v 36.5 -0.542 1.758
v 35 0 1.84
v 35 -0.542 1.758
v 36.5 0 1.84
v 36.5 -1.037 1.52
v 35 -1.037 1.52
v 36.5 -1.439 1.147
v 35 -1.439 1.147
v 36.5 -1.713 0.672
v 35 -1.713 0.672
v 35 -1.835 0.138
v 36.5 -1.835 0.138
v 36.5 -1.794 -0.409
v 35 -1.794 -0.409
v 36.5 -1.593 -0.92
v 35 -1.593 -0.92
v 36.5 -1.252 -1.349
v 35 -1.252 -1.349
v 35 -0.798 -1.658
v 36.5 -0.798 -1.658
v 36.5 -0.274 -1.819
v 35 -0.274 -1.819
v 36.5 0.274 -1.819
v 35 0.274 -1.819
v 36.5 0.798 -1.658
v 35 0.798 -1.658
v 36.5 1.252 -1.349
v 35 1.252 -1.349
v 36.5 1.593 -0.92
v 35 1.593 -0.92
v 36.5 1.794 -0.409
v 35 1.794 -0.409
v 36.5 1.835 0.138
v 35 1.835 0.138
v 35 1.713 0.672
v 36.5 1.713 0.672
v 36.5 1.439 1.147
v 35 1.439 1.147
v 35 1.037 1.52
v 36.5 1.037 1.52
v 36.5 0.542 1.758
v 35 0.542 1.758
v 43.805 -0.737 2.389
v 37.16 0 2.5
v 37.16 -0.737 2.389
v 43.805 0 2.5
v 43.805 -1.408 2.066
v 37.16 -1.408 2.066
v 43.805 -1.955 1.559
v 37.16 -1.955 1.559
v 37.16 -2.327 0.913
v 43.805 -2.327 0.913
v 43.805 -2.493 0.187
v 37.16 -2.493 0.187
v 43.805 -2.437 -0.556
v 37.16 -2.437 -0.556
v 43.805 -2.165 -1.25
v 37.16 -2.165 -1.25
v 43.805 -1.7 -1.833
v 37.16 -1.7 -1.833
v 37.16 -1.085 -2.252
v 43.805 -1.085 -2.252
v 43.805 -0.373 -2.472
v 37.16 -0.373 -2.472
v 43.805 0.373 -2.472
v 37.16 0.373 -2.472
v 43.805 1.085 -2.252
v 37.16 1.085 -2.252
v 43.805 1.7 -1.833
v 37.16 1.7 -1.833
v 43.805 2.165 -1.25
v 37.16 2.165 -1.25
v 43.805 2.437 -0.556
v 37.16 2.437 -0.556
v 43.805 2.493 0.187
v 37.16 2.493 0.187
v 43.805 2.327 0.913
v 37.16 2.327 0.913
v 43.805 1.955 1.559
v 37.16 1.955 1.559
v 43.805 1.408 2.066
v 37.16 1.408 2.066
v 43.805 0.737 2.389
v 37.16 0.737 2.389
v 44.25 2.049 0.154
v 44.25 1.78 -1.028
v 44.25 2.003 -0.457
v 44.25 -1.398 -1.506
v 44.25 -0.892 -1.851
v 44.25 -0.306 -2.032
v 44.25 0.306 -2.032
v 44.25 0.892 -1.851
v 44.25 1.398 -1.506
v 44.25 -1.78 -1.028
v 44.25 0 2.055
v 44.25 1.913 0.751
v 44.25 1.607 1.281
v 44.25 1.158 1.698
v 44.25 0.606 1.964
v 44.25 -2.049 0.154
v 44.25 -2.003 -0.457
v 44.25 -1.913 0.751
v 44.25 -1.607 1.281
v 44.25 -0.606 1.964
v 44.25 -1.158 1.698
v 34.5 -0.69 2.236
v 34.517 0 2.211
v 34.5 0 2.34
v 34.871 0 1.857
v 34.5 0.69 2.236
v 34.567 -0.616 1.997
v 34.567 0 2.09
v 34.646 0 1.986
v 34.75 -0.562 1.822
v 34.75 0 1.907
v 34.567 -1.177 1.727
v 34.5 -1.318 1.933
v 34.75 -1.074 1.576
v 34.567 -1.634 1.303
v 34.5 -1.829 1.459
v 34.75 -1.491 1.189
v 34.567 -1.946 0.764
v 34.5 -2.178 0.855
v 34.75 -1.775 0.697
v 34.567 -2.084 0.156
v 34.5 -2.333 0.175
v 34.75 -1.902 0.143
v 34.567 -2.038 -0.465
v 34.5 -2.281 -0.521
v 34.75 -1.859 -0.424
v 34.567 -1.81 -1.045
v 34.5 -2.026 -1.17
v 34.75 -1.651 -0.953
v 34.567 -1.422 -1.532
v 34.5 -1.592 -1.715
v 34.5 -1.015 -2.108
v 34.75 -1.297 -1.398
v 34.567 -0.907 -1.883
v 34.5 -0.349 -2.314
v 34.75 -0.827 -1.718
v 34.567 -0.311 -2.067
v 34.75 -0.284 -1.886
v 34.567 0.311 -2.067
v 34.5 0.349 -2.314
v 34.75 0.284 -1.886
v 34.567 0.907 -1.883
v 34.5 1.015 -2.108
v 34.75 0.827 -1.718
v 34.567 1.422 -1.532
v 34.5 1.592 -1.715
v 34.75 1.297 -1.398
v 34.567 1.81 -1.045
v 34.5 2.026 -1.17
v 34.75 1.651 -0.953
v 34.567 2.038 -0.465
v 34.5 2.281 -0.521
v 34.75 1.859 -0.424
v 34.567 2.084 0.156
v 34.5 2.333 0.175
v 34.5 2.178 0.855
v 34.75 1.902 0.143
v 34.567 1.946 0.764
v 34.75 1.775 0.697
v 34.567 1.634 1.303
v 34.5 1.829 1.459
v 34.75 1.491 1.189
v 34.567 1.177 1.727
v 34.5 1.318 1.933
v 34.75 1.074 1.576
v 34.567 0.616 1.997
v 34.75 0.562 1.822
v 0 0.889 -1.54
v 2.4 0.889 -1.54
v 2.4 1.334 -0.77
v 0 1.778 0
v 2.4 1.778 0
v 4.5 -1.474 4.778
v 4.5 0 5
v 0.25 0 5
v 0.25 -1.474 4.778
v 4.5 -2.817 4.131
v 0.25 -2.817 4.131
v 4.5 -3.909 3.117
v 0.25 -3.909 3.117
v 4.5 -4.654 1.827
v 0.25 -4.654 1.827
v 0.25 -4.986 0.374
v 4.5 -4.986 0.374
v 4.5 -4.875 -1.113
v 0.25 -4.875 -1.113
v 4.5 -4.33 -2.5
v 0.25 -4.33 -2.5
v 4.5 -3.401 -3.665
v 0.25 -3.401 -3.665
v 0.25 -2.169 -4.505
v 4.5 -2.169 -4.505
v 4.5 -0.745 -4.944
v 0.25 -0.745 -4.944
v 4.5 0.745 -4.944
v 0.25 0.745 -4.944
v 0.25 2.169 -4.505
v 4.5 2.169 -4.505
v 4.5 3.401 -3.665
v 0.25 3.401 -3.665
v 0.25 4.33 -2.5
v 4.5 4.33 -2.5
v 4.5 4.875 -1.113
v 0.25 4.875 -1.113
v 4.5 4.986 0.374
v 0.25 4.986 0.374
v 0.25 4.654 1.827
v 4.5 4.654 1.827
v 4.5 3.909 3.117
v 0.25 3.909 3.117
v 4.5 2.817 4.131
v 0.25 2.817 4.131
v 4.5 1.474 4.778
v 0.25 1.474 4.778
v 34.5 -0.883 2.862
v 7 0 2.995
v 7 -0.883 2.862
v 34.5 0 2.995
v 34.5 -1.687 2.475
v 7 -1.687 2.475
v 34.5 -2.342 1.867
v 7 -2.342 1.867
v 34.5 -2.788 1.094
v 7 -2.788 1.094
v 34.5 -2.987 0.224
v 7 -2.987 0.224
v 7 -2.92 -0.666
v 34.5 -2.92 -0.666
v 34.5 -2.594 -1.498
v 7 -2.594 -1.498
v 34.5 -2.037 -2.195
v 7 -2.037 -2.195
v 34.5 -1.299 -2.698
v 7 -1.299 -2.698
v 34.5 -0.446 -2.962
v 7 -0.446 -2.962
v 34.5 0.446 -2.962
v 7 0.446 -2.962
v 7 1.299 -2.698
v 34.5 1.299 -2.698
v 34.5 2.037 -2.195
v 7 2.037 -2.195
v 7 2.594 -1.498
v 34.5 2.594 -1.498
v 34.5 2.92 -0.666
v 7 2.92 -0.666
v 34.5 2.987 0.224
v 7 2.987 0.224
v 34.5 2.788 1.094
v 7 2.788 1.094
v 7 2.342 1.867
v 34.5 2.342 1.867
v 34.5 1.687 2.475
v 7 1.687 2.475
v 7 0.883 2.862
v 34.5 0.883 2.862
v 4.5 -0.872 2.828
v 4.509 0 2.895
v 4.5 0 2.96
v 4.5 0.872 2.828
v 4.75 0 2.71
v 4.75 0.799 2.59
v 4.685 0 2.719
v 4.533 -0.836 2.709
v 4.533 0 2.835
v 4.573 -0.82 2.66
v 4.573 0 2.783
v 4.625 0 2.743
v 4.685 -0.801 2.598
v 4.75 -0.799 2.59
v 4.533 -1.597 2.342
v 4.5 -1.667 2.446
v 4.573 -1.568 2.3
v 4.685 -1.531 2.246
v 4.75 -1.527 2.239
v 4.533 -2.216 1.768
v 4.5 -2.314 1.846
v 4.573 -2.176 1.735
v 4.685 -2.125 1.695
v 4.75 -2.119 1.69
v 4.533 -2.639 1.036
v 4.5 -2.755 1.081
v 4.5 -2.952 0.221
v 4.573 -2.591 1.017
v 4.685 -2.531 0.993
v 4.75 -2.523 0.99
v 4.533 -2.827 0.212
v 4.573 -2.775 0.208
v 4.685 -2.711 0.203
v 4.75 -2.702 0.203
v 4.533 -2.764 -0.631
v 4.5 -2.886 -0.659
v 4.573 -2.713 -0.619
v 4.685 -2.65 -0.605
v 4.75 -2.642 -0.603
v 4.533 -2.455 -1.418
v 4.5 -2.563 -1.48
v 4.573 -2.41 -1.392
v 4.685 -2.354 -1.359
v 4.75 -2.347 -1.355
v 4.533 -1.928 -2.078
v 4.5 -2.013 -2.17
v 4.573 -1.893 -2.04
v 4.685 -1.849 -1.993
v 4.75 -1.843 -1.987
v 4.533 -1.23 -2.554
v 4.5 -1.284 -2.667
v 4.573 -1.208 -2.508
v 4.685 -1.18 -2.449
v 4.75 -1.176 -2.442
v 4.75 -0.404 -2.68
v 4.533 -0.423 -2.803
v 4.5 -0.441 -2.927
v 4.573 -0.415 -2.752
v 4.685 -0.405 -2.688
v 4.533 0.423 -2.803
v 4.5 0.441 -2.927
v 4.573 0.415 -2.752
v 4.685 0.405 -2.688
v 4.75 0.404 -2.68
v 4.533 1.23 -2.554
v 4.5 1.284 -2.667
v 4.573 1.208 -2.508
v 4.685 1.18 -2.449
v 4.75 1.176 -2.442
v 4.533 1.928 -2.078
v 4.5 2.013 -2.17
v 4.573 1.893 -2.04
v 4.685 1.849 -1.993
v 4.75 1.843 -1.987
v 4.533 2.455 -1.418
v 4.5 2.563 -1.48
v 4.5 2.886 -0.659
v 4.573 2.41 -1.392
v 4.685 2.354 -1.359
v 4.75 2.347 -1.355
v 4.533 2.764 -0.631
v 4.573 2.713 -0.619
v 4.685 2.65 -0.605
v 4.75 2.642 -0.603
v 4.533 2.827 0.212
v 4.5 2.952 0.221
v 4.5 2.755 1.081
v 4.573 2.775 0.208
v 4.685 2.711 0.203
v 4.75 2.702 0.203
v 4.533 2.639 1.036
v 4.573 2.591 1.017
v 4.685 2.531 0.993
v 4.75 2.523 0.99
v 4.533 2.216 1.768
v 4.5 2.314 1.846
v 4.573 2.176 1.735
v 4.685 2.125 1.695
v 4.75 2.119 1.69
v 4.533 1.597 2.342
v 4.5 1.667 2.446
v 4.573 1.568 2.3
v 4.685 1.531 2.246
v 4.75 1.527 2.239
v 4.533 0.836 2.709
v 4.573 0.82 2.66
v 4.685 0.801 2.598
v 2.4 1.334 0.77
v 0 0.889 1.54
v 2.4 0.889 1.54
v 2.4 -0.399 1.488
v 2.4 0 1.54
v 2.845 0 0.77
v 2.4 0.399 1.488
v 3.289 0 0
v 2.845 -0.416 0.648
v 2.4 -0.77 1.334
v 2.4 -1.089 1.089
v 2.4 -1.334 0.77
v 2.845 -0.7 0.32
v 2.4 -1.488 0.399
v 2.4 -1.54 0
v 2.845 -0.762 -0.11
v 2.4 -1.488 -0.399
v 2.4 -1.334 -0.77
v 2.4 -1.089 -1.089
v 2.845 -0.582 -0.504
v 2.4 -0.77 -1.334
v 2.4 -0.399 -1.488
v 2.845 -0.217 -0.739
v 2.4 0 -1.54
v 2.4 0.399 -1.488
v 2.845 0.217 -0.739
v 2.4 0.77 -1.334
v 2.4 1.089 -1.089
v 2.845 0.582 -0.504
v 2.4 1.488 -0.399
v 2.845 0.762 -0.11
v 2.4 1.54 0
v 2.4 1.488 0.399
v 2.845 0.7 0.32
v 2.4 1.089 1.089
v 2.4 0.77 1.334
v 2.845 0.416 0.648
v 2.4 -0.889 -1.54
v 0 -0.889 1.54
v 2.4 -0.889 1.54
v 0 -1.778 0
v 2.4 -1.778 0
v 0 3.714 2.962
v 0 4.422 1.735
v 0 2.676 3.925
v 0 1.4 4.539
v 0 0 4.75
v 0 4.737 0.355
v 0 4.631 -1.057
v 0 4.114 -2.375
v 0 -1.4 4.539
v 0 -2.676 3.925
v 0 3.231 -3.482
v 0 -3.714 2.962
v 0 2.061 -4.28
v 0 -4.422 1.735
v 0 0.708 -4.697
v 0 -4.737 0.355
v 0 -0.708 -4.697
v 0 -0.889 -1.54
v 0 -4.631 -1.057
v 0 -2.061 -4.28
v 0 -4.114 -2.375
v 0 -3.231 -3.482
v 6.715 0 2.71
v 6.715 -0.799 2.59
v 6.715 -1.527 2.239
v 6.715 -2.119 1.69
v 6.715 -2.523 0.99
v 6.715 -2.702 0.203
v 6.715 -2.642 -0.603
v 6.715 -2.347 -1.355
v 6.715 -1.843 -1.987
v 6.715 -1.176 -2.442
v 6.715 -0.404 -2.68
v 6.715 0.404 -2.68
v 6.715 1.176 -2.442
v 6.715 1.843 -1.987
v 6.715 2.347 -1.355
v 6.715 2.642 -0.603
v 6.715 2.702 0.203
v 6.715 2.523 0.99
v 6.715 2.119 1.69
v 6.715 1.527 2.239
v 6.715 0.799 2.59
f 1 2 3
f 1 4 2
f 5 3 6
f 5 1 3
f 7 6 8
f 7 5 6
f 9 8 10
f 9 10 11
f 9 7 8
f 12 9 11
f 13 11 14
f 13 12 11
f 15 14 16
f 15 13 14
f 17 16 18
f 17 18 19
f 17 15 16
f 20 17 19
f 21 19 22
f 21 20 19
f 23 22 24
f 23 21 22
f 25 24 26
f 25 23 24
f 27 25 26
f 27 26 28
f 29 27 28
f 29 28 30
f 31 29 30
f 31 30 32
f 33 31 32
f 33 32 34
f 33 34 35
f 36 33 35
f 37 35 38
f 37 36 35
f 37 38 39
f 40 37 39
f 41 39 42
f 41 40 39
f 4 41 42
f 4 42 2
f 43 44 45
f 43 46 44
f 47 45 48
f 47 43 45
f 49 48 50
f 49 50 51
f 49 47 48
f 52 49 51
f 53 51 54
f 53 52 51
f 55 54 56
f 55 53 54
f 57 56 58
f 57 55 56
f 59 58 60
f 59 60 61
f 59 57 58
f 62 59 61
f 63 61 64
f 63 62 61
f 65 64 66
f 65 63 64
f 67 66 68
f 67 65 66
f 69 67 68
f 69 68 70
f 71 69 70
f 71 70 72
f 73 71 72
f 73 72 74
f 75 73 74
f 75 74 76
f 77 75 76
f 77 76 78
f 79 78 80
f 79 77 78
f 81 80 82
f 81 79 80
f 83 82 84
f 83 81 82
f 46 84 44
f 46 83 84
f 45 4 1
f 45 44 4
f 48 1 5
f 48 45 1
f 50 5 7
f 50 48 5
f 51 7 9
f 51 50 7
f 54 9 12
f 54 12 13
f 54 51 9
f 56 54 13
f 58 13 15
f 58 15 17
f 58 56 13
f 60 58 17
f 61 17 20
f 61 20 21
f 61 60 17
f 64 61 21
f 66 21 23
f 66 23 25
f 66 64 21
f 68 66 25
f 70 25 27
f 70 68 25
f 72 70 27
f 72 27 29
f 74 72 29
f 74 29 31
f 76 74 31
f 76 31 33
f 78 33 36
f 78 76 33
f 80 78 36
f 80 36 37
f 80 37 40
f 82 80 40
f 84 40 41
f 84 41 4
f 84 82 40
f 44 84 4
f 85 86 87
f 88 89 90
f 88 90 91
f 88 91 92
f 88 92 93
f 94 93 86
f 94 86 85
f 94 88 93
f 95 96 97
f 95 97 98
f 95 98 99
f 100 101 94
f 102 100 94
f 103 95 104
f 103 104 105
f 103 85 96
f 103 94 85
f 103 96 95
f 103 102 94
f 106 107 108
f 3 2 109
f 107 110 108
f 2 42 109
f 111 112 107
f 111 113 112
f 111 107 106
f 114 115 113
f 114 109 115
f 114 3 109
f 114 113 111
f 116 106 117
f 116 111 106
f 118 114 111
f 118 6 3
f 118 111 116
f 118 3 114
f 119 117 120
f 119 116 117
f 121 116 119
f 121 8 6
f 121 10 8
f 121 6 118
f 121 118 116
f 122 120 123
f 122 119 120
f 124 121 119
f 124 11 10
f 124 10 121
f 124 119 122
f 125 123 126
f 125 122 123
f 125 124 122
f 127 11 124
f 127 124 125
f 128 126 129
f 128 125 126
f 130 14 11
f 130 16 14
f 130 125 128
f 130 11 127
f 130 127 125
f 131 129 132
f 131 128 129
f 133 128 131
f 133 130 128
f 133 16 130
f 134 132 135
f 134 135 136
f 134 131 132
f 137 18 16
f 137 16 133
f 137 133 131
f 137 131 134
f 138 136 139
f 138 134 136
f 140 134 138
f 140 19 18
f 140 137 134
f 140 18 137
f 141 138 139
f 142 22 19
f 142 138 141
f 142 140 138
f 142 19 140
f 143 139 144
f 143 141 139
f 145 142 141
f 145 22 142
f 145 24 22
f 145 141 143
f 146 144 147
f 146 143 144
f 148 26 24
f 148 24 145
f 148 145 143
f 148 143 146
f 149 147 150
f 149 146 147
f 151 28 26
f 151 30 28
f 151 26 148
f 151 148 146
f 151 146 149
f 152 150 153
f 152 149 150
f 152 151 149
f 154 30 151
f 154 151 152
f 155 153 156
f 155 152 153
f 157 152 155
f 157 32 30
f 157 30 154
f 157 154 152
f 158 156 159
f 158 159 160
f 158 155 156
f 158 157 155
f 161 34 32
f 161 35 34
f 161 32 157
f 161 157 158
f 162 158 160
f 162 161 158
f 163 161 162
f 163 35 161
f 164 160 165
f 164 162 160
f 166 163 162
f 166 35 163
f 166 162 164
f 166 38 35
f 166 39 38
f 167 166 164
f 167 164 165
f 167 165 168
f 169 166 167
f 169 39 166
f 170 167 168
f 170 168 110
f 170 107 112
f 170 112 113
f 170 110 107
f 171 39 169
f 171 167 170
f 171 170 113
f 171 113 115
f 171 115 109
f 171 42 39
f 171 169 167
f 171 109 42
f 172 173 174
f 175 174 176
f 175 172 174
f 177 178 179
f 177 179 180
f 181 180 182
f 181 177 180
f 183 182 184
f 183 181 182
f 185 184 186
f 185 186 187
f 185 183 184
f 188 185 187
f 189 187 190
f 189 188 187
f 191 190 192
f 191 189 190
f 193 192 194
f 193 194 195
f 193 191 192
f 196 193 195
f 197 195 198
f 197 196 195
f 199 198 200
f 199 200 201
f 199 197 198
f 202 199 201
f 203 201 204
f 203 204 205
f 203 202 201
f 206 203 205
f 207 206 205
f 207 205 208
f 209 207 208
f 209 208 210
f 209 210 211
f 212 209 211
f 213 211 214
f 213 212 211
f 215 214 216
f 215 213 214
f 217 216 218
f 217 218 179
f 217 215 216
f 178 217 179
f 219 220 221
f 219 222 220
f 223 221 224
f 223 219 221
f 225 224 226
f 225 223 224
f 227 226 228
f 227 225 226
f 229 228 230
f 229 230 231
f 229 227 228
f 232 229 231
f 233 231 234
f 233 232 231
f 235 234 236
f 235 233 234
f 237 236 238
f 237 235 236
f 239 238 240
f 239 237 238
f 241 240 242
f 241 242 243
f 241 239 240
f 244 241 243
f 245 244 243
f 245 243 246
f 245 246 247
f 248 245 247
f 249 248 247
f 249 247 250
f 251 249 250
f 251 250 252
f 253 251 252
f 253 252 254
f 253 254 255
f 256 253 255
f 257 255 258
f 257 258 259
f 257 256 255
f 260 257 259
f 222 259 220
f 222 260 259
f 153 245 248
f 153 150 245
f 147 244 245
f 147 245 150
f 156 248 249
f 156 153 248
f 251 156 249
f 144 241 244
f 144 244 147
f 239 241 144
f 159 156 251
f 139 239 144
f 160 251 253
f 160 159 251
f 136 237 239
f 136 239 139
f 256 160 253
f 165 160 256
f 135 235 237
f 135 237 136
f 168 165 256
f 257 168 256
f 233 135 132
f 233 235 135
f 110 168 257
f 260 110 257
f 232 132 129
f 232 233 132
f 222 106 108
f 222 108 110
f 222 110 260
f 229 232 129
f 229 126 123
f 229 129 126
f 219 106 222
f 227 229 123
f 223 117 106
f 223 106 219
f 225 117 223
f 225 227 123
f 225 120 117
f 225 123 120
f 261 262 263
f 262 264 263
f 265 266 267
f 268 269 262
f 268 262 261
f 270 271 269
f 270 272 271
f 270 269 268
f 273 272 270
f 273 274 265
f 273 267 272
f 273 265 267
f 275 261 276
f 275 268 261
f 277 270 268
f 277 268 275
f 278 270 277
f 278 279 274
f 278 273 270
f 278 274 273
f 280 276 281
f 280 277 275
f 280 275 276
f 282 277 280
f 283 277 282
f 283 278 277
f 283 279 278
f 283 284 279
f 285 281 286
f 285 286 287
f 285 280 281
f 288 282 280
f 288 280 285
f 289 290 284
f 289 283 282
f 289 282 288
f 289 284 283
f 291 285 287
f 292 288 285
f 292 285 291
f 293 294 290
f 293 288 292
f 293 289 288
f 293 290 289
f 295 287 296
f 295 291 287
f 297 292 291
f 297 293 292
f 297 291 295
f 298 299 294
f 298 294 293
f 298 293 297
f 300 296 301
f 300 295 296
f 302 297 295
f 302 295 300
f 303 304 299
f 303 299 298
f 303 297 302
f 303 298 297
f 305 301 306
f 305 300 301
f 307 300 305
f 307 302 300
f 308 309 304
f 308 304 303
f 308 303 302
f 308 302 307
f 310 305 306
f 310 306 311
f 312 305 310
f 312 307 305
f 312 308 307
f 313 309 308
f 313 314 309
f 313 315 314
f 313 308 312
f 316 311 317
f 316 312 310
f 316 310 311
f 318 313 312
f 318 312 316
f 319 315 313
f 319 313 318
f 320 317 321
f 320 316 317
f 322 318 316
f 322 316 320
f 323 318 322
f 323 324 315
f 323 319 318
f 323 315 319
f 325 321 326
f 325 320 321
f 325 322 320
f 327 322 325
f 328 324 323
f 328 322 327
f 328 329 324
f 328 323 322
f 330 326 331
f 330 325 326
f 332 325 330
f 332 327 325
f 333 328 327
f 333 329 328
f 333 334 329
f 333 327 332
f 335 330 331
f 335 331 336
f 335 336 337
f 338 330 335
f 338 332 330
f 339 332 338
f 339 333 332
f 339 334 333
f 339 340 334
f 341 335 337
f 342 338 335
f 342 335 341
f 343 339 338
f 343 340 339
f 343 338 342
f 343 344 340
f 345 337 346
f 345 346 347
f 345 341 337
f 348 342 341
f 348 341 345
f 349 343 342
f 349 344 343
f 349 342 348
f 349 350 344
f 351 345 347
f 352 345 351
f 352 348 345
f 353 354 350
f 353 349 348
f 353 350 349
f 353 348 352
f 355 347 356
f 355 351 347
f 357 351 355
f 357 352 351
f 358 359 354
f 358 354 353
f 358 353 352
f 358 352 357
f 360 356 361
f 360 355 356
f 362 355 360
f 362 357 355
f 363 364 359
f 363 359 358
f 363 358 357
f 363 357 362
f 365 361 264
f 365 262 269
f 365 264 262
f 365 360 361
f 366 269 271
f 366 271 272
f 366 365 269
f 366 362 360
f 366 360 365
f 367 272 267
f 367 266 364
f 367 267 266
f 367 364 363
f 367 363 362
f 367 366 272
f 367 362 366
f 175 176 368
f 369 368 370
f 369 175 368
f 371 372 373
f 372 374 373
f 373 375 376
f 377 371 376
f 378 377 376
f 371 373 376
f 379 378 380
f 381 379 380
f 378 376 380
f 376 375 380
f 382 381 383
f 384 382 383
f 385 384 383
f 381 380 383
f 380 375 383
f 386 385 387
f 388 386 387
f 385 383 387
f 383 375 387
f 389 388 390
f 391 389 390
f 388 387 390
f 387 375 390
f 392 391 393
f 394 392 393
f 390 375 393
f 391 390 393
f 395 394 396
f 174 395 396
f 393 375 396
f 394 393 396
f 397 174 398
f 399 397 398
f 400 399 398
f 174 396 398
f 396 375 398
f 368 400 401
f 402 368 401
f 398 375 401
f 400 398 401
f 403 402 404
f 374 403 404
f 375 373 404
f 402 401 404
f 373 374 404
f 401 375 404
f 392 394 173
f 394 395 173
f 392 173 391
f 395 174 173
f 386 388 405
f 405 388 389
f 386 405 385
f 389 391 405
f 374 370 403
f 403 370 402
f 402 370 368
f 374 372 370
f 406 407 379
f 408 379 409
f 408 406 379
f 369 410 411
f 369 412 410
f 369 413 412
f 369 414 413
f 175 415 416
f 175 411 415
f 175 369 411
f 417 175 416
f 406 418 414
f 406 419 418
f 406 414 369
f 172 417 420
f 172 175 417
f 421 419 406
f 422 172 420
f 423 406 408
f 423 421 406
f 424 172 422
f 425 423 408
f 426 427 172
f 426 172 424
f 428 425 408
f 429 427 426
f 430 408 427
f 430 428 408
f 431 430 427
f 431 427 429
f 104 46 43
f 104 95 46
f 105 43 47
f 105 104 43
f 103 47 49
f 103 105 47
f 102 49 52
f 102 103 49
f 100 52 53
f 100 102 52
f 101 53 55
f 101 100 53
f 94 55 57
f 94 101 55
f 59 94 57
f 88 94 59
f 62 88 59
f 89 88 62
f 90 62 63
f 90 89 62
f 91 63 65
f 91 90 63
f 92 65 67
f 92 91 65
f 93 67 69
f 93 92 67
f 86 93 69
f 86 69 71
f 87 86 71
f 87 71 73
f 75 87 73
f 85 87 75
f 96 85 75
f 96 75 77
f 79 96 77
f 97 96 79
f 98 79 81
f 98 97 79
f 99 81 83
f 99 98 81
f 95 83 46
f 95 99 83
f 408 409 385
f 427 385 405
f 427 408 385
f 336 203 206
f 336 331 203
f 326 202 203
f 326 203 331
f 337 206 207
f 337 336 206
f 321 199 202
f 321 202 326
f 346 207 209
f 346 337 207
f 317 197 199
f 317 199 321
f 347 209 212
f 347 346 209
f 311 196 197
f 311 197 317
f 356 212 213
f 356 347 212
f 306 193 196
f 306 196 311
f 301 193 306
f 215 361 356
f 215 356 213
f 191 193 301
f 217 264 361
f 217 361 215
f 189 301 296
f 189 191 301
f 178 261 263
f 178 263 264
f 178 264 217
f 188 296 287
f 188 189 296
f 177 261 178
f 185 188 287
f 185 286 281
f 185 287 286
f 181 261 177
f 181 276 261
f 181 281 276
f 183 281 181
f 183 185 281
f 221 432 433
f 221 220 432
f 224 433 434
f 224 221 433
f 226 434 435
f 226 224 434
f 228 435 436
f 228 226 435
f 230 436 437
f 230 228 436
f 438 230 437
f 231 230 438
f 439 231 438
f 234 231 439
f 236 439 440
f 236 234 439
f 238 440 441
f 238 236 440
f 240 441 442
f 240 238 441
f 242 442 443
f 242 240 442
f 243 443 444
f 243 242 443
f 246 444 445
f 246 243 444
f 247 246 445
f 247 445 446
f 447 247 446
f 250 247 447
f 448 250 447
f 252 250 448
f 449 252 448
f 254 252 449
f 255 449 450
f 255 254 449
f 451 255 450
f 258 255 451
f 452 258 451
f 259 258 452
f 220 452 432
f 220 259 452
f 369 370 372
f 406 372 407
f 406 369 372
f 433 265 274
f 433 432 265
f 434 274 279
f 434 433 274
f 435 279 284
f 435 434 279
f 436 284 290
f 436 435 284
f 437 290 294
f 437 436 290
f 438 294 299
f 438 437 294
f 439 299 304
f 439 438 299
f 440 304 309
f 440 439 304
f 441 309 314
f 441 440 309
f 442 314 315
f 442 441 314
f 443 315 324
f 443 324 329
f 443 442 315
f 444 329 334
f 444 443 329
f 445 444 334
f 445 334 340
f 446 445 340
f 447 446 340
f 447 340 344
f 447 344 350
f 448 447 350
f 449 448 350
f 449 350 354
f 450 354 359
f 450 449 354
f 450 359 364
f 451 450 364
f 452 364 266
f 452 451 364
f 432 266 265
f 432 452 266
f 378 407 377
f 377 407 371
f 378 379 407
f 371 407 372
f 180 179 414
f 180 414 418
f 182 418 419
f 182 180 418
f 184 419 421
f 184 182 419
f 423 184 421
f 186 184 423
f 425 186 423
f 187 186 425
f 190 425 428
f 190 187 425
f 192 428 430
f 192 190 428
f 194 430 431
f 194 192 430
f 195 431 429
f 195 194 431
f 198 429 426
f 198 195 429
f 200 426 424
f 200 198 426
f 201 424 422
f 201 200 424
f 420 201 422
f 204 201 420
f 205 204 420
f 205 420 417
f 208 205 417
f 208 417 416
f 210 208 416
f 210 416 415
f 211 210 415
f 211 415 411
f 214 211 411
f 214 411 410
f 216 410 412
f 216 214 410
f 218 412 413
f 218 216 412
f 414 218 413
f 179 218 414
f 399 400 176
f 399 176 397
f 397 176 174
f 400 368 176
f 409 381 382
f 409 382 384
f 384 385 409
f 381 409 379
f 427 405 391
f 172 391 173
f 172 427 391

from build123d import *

# Parameters (mm, degrees)
CHAMFER1_SIZE = 0.25
HEX_2_DEPTH   = 2.4


with BuildPart() as part:
    # BodySke → BaseBody (revolve)
    with BuildSketch(Plane.XY, mode=Mode.PRIVATE) as basebody_sk:
        with BuildLine():
            Line((0, 0), (0, 5))
            Line((0, 5), (4.5, 5))
            Line((4.5, 5), (4.5, 2.96))
            ThreePointArc((4.5, 2.96), (4.573223305, 2.783223305), (4.75, 2.71))
            Line((4.75, 2.71), (6.715, 2.71))
            Line((6.715, 2.71), (7, 2.995))
            Line((7, 2.995), (34.5, 2.995))
            Line((34.5, 2.995), (34.5, 2.34))
            ThreePointArc((34.5, 2.34), (34.646446609, 1.986446609), (35, 1.84))
            Line((35, 1.84), (36.5, 1.84))
            Line((36.5, 1.84), (37.16, 2.5))
            Line((37.16, 2.5), (43.805, 2.5))
            Line((43.805, 2.5), (44.25, 2.055))
            Line((44.25, 2.055), (44.25, 0))
            Line((44.25, 0), (0, 0))
        make_face()
    revolve(basebody_sk.sketch.rotate(Axis((-6.35, 0, 0), (1, 0, 0)), 90), axis=Axis((-6.35, 0, 0), (1, 0, 0)))

    # Chamfer1
    chamfer1_edges = [part.edges().sort_by_distance(p)[0] for p in [
        (0, 0, -5),
    ]]
    chamfer(chamfer1_edges, length=CHAMFER1_SIZE)

    # Sketch2 → PreBroach (revolve, cut)
    with BuildSketch(Plane.XY, mode=Mode.PRIVATE) as prebroach_sk:
        Polygon((0, 1.54), (2.4, 1.54), (3.289119415, 0), (0, 0), align=None)
    revolve(prebroach_sk.sketch.rotate(Axis((0, 0, 0), (1, 0, 0)), 90), axis=Axis((0, 0, 0), (1, 0, 0)), mode=Mode.SUBTRACT)

    # Sketch3 → Hex 2 (cut)
    with BuildSketch(Plane.ZY):
        Polygon((-1.54, -0.889119415), (-1.54, 0.889119415), (0, 1.778238829), (1.54, 0.889119415), (1.54, -0.889119415), (0, -1.778238829), align=None)
    extrude(amount=-HEX_2_DEPTH, mode=Mode.SUBTRACT)


solid = part.part
